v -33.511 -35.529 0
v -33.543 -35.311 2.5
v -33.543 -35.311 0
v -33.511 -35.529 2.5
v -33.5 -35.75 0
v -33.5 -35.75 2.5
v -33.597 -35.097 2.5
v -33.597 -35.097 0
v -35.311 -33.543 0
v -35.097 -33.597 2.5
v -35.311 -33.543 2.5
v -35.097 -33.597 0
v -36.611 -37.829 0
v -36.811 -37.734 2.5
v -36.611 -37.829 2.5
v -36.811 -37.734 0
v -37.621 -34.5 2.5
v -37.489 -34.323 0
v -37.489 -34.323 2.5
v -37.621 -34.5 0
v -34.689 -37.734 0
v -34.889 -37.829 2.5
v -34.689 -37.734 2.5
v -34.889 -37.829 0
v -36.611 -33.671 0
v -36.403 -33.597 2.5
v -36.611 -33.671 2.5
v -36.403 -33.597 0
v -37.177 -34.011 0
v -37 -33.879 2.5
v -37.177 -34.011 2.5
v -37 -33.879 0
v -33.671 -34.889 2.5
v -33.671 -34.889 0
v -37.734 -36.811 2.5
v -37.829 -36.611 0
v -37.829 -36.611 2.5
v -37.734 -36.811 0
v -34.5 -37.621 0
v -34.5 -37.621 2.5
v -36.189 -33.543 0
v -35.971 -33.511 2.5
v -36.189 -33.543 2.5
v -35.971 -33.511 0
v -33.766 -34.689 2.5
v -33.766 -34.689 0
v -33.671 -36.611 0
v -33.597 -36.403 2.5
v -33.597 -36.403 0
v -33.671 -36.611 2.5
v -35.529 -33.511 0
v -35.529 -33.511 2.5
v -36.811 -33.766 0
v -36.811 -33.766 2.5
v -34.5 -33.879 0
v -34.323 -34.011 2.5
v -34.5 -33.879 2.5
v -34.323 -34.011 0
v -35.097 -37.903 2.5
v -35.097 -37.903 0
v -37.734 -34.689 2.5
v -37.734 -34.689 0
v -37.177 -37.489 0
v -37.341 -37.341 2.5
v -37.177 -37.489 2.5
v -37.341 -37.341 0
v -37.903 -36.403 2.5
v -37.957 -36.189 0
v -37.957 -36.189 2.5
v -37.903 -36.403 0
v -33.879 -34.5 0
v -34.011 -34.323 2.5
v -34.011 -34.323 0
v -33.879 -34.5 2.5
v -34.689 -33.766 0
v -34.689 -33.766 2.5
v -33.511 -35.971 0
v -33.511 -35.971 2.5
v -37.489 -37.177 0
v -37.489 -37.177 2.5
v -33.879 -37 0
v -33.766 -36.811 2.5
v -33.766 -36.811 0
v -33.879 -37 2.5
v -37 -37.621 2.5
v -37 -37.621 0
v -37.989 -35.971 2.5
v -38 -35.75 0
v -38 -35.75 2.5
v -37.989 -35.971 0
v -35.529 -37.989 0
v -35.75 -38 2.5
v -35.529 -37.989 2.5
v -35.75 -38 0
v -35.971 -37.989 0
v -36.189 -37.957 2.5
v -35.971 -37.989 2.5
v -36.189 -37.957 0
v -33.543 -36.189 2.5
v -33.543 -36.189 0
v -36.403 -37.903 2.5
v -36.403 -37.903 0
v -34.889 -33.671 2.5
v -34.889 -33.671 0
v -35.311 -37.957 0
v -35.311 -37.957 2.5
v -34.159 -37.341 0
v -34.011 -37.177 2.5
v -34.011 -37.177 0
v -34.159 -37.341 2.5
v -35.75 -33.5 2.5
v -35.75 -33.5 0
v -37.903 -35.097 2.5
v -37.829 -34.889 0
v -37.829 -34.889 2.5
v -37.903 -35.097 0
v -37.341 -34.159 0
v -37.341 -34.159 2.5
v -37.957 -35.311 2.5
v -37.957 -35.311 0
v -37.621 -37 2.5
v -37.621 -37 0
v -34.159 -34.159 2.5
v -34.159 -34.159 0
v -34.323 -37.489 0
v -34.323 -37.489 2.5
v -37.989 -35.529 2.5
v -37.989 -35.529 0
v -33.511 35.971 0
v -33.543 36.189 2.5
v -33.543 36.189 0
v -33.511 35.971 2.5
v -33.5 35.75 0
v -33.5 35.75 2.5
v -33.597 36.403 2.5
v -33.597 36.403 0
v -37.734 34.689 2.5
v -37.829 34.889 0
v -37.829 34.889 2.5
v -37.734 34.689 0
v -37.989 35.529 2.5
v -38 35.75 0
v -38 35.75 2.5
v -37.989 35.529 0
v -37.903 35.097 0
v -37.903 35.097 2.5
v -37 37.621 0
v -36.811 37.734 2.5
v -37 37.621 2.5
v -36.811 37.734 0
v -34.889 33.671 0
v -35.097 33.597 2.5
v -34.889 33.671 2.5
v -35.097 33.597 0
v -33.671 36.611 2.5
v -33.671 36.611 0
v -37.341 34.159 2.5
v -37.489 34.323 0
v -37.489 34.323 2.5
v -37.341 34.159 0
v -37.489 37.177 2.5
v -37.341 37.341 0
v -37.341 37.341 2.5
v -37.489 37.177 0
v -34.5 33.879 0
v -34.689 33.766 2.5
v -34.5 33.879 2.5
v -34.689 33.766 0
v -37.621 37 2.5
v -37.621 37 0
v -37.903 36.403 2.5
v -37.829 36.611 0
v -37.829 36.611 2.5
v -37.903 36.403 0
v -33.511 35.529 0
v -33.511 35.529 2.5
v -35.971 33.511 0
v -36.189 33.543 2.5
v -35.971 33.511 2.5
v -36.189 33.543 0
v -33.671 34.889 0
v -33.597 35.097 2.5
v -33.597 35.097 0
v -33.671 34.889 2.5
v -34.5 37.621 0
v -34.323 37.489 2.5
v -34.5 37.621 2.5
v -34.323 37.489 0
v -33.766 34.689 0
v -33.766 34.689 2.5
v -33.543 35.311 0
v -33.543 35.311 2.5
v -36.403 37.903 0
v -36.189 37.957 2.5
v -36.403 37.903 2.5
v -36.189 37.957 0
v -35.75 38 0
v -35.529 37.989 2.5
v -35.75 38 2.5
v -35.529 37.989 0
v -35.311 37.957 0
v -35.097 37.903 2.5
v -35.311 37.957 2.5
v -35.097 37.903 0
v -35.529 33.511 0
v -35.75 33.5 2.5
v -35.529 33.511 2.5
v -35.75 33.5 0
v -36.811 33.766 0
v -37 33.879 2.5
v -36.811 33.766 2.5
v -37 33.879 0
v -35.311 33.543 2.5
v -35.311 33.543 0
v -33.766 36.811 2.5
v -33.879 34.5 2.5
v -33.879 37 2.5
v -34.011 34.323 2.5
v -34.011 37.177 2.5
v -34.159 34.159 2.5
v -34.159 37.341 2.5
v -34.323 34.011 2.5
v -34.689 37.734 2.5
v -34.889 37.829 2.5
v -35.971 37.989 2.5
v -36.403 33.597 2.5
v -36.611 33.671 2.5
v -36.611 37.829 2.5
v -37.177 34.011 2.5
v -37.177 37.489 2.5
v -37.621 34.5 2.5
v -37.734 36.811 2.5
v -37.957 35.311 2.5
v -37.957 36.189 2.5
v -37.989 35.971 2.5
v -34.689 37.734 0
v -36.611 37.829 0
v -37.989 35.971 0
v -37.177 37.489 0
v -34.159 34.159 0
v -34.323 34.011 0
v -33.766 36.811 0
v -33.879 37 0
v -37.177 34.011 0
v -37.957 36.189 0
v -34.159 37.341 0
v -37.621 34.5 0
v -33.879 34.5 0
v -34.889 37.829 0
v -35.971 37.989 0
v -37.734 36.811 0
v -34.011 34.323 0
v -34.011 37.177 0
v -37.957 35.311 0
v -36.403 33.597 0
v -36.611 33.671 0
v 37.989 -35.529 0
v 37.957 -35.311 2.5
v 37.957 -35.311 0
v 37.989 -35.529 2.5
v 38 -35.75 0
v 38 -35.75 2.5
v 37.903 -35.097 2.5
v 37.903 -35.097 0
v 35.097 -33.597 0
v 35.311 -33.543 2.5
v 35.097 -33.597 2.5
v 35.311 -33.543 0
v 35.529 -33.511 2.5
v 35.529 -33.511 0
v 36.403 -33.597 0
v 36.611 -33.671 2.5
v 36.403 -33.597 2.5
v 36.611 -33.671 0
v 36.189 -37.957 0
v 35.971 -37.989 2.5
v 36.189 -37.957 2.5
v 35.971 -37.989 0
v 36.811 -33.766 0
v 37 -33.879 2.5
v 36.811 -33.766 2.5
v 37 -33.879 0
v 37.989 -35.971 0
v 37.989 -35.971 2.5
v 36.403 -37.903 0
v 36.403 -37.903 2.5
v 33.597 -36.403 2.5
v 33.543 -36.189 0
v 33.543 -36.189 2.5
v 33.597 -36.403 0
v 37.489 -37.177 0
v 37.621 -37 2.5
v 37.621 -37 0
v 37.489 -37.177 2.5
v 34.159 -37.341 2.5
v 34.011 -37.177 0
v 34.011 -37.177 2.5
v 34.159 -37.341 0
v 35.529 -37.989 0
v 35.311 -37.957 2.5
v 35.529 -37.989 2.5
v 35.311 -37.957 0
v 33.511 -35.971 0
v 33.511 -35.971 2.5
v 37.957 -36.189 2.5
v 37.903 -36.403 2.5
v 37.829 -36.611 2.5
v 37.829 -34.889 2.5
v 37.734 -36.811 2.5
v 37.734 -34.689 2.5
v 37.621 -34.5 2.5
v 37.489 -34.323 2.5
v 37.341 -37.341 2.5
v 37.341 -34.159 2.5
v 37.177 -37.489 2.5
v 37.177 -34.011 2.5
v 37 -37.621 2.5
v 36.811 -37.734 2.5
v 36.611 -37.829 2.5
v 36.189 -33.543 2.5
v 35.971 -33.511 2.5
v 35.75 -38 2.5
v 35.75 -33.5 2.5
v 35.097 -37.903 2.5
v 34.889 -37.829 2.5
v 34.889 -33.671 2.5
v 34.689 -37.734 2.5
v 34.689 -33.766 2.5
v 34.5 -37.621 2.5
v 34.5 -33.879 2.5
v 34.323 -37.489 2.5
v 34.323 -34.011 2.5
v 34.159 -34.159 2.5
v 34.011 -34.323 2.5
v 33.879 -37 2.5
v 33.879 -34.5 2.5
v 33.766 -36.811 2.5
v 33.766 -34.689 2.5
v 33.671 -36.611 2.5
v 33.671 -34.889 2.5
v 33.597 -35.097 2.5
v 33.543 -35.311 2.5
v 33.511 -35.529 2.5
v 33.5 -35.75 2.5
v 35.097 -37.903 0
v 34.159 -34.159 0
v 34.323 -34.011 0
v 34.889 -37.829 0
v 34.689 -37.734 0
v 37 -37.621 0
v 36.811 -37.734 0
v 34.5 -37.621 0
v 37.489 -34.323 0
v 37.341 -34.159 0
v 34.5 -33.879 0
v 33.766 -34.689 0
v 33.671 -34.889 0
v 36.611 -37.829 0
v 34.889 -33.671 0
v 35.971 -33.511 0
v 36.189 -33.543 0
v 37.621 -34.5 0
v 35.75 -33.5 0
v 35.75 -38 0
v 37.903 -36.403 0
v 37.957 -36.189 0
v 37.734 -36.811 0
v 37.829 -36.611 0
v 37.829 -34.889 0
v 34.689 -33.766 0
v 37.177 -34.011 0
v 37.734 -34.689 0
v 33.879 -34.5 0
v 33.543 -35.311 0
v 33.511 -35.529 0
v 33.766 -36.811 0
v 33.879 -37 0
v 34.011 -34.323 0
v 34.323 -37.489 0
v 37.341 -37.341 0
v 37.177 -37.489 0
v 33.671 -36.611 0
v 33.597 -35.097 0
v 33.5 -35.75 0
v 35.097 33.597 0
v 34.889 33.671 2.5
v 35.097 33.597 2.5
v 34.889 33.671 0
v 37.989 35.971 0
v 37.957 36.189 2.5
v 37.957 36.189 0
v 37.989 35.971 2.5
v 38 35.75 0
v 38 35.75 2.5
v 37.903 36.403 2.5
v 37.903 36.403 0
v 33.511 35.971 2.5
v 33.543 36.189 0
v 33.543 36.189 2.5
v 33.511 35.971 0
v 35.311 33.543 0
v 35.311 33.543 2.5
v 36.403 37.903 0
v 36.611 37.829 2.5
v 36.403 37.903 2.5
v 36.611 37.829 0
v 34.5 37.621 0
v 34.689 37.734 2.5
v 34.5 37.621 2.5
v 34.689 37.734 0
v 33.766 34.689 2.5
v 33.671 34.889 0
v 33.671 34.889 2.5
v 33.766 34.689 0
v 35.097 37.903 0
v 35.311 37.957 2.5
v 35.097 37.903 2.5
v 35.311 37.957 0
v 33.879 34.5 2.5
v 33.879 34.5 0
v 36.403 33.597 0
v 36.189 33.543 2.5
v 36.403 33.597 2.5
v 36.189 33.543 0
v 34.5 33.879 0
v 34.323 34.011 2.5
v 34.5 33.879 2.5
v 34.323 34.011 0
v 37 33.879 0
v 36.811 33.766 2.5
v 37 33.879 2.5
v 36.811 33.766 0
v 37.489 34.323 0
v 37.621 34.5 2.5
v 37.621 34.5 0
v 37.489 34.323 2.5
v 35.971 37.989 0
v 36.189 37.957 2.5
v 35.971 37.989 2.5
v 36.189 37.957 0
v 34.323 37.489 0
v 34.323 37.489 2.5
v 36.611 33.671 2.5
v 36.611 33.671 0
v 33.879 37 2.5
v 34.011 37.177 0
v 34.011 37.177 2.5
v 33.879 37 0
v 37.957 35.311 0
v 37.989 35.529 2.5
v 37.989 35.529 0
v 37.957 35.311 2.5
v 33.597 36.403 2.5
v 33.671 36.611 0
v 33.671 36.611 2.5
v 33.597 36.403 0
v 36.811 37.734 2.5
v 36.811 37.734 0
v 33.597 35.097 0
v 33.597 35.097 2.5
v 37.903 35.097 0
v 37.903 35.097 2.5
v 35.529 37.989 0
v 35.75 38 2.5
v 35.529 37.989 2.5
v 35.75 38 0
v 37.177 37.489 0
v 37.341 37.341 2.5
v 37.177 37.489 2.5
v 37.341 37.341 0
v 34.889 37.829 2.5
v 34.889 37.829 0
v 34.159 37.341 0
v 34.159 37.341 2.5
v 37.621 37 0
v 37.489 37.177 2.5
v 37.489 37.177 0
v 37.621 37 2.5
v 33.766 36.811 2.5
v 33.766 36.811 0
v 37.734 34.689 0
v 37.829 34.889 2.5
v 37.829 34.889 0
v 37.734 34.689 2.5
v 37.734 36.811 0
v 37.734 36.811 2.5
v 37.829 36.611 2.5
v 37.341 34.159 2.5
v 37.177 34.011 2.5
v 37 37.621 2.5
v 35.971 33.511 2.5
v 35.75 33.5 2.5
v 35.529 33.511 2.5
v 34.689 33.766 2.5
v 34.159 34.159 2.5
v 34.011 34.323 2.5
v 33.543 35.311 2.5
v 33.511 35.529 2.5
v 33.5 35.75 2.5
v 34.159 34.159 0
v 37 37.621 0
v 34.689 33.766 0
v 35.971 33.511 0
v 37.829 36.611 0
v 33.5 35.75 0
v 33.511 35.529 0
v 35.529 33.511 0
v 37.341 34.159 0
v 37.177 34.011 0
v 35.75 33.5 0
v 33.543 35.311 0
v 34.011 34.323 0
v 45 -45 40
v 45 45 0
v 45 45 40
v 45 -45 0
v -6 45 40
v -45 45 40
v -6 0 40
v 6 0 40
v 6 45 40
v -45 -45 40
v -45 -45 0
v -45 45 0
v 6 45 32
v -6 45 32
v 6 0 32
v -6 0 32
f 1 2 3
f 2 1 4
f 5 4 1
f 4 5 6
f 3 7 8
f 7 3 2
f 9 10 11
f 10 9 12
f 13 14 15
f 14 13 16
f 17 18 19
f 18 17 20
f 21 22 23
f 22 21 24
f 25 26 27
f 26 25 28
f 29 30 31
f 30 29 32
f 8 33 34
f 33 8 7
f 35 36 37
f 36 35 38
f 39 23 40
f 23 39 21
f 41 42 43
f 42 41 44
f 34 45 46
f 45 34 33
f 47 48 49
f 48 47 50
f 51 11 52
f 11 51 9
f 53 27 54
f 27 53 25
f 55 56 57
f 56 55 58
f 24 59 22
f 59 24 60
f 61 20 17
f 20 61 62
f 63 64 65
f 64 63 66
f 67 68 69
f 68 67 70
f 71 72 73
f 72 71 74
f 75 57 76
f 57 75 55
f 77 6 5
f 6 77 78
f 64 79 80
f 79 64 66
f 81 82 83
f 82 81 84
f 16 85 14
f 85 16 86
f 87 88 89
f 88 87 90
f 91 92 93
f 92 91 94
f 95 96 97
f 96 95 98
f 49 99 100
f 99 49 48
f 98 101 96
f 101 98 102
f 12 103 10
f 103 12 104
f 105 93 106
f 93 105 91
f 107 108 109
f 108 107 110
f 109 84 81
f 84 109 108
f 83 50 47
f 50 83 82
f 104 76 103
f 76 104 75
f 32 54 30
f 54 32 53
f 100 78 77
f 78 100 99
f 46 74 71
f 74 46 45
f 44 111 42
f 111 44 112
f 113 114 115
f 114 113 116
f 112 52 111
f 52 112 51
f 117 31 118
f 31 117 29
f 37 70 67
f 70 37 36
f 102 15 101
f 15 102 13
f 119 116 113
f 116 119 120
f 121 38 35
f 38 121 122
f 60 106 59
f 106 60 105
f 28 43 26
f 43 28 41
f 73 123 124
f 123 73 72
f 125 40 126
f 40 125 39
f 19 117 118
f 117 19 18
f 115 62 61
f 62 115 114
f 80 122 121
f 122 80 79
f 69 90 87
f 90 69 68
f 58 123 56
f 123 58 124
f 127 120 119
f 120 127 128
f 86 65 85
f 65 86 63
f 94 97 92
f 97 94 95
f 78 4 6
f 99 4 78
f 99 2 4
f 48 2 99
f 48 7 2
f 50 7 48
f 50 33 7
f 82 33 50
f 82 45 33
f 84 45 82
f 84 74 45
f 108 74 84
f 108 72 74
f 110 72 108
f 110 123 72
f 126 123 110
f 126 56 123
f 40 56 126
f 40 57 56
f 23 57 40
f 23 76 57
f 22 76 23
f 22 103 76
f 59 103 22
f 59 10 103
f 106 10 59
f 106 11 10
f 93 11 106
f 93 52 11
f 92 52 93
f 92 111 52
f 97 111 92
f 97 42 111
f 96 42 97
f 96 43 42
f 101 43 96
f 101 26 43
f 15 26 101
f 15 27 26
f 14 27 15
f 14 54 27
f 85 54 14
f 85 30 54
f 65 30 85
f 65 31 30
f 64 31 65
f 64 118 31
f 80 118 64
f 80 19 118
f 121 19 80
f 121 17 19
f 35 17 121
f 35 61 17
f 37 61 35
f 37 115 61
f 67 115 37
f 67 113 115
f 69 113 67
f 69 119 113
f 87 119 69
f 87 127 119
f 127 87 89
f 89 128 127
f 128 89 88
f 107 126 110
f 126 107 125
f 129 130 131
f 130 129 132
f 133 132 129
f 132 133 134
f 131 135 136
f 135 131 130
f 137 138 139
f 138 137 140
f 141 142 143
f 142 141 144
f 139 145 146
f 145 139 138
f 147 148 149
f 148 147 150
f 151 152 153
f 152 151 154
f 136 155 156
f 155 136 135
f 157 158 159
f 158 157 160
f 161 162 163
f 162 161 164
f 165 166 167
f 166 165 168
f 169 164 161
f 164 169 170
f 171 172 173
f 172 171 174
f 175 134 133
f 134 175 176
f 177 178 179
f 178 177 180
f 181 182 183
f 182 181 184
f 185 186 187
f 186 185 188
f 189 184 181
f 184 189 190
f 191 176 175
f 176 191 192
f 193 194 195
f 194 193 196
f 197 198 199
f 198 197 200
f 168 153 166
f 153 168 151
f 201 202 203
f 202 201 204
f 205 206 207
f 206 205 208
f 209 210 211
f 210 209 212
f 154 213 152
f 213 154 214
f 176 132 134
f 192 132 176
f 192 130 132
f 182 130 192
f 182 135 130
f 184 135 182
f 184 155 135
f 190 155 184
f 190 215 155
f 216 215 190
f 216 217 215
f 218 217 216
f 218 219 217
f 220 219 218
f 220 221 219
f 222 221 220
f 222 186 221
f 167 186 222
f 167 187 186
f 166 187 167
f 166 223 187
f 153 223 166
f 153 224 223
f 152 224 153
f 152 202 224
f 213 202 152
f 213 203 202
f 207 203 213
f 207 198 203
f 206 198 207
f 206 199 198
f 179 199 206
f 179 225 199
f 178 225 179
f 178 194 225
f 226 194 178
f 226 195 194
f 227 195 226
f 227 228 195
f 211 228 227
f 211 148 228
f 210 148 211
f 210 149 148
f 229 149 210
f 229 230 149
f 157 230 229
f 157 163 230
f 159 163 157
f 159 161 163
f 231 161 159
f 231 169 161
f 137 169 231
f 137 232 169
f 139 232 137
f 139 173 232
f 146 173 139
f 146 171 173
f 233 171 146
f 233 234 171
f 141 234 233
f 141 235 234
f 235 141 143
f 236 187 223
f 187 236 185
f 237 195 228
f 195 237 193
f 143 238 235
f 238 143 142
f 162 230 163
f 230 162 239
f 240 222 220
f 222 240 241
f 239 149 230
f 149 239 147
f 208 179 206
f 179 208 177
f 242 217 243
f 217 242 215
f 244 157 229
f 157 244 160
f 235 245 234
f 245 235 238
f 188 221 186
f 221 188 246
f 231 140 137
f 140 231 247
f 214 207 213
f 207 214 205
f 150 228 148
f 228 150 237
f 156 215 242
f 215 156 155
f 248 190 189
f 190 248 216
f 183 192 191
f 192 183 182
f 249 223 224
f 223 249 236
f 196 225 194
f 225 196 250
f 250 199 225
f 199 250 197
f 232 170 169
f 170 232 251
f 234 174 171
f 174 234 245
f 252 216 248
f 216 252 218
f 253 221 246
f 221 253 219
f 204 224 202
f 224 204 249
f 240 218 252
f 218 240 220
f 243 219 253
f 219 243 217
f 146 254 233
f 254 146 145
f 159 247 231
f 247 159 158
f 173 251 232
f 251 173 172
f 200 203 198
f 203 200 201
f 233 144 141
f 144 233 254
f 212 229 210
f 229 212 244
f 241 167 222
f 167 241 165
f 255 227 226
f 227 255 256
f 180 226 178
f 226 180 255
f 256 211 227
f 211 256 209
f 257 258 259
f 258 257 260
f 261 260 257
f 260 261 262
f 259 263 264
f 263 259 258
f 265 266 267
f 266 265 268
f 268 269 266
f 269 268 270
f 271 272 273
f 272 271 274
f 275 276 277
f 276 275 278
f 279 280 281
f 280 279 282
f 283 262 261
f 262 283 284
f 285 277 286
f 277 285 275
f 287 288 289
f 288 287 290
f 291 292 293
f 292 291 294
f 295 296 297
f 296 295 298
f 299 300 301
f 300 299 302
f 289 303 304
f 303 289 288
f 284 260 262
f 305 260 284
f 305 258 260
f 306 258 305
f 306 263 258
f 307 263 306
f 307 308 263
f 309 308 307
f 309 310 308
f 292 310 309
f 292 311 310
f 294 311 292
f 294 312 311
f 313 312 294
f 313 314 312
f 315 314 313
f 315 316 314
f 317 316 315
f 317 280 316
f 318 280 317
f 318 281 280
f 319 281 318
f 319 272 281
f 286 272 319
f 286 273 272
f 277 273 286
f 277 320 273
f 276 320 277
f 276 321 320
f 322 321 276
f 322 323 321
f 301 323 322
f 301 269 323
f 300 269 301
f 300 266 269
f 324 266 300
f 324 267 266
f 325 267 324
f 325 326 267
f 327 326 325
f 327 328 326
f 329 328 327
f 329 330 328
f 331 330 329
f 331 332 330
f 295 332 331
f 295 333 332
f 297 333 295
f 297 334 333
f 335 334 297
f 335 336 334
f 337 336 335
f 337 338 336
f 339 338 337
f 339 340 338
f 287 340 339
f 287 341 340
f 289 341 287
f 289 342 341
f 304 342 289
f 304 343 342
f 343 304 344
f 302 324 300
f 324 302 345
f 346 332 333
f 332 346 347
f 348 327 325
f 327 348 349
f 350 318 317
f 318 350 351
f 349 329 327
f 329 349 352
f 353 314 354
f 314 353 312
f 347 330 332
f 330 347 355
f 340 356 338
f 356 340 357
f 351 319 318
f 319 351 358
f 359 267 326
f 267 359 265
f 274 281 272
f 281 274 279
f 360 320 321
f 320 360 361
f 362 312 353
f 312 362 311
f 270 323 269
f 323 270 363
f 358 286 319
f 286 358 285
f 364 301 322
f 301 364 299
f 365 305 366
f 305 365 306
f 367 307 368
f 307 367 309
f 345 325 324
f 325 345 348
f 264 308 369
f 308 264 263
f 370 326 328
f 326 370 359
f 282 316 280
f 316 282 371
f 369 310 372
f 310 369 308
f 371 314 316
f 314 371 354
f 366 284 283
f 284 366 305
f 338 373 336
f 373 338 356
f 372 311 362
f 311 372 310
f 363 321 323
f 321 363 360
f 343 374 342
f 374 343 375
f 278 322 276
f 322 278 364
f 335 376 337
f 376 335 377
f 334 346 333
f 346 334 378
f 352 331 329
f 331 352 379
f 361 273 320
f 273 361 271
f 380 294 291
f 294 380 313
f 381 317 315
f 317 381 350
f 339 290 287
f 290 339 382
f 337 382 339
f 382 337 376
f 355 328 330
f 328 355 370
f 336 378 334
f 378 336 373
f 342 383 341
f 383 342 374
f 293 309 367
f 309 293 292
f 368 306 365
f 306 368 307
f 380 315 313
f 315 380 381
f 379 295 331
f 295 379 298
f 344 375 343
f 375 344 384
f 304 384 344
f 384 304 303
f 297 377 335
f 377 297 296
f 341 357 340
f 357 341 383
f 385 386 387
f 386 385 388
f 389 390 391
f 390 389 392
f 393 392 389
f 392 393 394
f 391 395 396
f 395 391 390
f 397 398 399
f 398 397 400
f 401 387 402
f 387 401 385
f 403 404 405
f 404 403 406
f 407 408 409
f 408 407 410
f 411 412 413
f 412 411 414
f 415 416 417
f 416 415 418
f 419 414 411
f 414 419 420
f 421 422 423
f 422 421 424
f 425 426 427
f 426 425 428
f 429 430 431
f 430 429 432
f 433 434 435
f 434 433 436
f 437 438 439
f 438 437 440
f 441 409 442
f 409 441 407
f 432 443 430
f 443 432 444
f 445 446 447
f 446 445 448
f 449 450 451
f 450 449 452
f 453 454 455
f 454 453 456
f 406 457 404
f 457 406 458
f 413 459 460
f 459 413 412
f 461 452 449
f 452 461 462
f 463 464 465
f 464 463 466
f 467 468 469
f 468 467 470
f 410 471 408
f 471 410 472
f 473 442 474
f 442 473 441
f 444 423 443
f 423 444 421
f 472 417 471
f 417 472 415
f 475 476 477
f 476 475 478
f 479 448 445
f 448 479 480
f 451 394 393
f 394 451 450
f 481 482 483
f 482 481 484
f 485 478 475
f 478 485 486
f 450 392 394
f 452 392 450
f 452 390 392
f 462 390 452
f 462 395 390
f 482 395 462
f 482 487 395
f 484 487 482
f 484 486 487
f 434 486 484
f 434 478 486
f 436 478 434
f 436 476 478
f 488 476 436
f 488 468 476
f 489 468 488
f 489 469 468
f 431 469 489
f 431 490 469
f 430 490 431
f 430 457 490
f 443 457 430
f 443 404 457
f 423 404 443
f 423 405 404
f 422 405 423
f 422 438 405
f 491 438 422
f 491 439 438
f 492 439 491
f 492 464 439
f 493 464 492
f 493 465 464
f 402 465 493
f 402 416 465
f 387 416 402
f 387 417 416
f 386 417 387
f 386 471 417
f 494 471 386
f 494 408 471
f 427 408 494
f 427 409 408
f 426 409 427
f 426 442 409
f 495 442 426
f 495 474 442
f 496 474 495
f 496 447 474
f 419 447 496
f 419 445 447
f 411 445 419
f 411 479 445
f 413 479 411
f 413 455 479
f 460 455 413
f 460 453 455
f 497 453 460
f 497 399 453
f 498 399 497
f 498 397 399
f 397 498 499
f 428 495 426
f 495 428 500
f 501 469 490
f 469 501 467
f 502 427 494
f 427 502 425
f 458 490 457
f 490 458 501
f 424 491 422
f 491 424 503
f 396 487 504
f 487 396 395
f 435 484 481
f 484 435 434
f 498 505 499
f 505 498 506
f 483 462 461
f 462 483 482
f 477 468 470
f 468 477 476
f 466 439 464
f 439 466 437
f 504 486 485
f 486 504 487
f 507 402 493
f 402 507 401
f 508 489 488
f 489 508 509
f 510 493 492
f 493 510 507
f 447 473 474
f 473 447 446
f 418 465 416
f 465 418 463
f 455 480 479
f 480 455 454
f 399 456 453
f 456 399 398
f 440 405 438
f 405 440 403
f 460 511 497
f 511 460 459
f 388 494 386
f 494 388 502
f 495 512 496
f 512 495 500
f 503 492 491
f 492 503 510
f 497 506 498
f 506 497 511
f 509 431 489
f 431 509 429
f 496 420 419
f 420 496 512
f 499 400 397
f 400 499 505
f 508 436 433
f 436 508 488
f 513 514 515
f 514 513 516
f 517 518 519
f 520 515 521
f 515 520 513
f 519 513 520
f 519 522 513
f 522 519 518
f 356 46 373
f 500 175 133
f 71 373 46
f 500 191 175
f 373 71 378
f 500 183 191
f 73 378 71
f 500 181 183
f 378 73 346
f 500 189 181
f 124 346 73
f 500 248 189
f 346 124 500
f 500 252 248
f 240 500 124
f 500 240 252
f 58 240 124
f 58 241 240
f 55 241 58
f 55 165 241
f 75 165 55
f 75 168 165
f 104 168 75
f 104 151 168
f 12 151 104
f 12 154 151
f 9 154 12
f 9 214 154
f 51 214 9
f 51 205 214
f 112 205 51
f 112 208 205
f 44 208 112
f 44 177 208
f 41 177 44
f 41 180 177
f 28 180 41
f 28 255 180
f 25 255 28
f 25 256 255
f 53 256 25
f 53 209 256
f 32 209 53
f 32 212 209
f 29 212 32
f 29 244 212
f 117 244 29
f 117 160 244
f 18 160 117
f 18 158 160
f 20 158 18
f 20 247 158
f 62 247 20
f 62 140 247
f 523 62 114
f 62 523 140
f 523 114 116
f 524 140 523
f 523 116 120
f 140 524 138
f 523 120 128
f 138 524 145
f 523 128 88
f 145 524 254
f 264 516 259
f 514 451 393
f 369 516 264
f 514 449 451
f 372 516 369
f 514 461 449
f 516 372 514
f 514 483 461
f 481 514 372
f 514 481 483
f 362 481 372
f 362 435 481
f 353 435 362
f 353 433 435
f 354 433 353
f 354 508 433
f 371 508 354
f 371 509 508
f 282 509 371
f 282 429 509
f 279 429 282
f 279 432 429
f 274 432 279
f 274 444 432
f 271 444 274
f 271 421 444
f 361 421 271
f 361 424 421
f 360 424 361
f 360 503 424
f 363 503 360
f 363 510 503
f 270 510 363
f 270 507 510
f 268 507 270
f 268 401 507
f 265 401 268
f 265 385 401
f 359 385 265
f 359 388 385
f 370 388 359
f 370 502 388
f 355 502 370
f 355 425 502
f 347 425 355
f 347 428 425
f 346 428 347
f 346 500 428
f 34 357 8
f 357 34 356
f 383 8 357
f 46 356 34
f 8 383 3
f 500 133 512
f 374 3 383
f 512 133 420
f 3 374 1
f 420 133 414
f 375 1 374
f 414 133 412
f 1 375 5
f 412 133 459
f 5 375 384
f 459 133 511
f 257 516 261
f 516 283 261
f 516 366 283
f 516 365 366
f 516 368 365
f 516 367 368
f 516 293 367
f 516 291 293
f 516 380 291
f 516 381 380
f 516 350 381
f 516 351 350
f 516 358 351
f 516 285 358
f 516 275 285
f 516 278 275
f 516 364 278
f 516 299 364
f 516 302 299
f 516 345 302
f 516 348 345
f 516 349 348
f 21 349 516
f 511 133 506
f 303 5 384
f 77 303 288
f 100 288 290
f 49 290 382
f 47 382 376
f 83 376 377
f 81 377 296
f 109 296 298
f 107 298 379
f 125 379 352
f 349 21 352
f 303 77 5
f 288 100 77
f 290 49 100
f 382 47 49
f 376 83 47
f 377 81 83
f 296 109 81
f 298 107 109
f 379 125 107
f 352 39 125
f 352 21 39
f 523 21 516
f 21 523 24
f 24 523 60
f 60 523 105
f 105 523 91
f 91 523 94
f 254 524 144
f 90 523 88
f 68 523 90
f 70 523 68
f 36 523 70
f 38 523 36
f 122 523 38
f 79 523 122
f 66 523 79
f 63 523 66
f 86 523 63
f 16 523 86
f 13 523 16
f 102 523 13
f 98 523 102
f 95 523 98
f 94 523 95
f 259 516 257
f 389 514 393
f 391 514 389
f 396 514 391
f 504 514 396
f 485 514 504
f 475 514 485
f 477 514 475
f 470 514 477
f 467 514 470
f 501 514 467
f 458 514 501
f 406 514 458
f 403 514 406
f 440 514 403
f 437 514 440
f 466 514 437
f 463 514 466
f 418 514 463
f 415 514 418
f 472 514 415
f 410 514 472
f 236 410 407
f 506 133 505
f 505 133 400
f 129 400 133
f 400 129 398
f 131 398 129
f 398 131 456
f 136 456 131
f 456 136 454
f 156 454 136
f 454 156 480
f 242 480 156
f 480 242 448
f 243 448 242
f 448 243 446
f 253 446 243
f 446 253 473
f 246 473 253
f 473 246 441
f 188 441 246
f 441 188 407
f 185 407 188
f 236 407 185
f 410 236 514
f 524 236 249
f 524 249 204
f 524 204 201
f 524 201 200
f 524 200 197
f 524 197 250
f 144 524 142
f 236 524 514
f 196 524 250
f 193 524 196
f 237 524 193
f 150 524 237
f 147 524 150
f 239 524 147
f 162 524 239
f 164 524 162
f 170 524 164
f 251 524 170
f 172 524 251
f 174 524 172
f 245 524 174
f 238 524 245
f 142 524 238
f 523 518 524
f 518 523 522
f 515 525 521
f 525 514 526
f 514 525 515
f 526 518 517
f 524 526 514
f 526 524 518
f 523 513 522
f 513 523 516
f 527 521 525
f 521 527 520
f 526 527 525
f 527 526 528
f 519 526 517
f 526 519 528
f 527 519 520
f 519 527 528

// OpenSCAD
// Magnetic stirrer housing for 80 mm PC case fan
// Print orientation: top plate on bed (z = 0), walls build upward (+Z)

// ---------- Dimensions (mm) ----------
plate_t      = 2;     // top plate thickness
wall_t       = 2.5;   // wall thickness
box_h        = 40;    // total height of box (open top)
outer_x      = 90;    // outer size in X
outer_y      = 90;    // outer size in Y
hole_d       = 4.5;   // M4 screw hole diameter
hole_pitch   = 71.5;  // square pattern centre-to-centre
notch_w      = 12;    // cable notch width
notch_depth  = 8;     // notch depth from open edge (z = 32 to 40)
eps          = 0.5;   // cutter overshoot past faces

$fn = 64;

// ---------- Model ----------
difference() {
    // Solid outer block
    translate([-outer_x / 2, -outer_y / 2, 0])
        cube([outer_x, outer_y, box_h]);

    // Four screw holes through the top plate
    for (sx = [-1, 1], sy = [-1, 1])
        translate([sx * hole_pitch / 2, sy * hole_pitch / 2, -eps])
            cylinder(d = hole_d, h = plate_t + 2 * eps);

    // Cable notch in one wall, centred along X, open at top edge
    translate([-notch_w / 2, 0, box_h - notch_depth])
        cube([notch_w, outer_y + 2 * eps, notch_depth + eps]);
}
